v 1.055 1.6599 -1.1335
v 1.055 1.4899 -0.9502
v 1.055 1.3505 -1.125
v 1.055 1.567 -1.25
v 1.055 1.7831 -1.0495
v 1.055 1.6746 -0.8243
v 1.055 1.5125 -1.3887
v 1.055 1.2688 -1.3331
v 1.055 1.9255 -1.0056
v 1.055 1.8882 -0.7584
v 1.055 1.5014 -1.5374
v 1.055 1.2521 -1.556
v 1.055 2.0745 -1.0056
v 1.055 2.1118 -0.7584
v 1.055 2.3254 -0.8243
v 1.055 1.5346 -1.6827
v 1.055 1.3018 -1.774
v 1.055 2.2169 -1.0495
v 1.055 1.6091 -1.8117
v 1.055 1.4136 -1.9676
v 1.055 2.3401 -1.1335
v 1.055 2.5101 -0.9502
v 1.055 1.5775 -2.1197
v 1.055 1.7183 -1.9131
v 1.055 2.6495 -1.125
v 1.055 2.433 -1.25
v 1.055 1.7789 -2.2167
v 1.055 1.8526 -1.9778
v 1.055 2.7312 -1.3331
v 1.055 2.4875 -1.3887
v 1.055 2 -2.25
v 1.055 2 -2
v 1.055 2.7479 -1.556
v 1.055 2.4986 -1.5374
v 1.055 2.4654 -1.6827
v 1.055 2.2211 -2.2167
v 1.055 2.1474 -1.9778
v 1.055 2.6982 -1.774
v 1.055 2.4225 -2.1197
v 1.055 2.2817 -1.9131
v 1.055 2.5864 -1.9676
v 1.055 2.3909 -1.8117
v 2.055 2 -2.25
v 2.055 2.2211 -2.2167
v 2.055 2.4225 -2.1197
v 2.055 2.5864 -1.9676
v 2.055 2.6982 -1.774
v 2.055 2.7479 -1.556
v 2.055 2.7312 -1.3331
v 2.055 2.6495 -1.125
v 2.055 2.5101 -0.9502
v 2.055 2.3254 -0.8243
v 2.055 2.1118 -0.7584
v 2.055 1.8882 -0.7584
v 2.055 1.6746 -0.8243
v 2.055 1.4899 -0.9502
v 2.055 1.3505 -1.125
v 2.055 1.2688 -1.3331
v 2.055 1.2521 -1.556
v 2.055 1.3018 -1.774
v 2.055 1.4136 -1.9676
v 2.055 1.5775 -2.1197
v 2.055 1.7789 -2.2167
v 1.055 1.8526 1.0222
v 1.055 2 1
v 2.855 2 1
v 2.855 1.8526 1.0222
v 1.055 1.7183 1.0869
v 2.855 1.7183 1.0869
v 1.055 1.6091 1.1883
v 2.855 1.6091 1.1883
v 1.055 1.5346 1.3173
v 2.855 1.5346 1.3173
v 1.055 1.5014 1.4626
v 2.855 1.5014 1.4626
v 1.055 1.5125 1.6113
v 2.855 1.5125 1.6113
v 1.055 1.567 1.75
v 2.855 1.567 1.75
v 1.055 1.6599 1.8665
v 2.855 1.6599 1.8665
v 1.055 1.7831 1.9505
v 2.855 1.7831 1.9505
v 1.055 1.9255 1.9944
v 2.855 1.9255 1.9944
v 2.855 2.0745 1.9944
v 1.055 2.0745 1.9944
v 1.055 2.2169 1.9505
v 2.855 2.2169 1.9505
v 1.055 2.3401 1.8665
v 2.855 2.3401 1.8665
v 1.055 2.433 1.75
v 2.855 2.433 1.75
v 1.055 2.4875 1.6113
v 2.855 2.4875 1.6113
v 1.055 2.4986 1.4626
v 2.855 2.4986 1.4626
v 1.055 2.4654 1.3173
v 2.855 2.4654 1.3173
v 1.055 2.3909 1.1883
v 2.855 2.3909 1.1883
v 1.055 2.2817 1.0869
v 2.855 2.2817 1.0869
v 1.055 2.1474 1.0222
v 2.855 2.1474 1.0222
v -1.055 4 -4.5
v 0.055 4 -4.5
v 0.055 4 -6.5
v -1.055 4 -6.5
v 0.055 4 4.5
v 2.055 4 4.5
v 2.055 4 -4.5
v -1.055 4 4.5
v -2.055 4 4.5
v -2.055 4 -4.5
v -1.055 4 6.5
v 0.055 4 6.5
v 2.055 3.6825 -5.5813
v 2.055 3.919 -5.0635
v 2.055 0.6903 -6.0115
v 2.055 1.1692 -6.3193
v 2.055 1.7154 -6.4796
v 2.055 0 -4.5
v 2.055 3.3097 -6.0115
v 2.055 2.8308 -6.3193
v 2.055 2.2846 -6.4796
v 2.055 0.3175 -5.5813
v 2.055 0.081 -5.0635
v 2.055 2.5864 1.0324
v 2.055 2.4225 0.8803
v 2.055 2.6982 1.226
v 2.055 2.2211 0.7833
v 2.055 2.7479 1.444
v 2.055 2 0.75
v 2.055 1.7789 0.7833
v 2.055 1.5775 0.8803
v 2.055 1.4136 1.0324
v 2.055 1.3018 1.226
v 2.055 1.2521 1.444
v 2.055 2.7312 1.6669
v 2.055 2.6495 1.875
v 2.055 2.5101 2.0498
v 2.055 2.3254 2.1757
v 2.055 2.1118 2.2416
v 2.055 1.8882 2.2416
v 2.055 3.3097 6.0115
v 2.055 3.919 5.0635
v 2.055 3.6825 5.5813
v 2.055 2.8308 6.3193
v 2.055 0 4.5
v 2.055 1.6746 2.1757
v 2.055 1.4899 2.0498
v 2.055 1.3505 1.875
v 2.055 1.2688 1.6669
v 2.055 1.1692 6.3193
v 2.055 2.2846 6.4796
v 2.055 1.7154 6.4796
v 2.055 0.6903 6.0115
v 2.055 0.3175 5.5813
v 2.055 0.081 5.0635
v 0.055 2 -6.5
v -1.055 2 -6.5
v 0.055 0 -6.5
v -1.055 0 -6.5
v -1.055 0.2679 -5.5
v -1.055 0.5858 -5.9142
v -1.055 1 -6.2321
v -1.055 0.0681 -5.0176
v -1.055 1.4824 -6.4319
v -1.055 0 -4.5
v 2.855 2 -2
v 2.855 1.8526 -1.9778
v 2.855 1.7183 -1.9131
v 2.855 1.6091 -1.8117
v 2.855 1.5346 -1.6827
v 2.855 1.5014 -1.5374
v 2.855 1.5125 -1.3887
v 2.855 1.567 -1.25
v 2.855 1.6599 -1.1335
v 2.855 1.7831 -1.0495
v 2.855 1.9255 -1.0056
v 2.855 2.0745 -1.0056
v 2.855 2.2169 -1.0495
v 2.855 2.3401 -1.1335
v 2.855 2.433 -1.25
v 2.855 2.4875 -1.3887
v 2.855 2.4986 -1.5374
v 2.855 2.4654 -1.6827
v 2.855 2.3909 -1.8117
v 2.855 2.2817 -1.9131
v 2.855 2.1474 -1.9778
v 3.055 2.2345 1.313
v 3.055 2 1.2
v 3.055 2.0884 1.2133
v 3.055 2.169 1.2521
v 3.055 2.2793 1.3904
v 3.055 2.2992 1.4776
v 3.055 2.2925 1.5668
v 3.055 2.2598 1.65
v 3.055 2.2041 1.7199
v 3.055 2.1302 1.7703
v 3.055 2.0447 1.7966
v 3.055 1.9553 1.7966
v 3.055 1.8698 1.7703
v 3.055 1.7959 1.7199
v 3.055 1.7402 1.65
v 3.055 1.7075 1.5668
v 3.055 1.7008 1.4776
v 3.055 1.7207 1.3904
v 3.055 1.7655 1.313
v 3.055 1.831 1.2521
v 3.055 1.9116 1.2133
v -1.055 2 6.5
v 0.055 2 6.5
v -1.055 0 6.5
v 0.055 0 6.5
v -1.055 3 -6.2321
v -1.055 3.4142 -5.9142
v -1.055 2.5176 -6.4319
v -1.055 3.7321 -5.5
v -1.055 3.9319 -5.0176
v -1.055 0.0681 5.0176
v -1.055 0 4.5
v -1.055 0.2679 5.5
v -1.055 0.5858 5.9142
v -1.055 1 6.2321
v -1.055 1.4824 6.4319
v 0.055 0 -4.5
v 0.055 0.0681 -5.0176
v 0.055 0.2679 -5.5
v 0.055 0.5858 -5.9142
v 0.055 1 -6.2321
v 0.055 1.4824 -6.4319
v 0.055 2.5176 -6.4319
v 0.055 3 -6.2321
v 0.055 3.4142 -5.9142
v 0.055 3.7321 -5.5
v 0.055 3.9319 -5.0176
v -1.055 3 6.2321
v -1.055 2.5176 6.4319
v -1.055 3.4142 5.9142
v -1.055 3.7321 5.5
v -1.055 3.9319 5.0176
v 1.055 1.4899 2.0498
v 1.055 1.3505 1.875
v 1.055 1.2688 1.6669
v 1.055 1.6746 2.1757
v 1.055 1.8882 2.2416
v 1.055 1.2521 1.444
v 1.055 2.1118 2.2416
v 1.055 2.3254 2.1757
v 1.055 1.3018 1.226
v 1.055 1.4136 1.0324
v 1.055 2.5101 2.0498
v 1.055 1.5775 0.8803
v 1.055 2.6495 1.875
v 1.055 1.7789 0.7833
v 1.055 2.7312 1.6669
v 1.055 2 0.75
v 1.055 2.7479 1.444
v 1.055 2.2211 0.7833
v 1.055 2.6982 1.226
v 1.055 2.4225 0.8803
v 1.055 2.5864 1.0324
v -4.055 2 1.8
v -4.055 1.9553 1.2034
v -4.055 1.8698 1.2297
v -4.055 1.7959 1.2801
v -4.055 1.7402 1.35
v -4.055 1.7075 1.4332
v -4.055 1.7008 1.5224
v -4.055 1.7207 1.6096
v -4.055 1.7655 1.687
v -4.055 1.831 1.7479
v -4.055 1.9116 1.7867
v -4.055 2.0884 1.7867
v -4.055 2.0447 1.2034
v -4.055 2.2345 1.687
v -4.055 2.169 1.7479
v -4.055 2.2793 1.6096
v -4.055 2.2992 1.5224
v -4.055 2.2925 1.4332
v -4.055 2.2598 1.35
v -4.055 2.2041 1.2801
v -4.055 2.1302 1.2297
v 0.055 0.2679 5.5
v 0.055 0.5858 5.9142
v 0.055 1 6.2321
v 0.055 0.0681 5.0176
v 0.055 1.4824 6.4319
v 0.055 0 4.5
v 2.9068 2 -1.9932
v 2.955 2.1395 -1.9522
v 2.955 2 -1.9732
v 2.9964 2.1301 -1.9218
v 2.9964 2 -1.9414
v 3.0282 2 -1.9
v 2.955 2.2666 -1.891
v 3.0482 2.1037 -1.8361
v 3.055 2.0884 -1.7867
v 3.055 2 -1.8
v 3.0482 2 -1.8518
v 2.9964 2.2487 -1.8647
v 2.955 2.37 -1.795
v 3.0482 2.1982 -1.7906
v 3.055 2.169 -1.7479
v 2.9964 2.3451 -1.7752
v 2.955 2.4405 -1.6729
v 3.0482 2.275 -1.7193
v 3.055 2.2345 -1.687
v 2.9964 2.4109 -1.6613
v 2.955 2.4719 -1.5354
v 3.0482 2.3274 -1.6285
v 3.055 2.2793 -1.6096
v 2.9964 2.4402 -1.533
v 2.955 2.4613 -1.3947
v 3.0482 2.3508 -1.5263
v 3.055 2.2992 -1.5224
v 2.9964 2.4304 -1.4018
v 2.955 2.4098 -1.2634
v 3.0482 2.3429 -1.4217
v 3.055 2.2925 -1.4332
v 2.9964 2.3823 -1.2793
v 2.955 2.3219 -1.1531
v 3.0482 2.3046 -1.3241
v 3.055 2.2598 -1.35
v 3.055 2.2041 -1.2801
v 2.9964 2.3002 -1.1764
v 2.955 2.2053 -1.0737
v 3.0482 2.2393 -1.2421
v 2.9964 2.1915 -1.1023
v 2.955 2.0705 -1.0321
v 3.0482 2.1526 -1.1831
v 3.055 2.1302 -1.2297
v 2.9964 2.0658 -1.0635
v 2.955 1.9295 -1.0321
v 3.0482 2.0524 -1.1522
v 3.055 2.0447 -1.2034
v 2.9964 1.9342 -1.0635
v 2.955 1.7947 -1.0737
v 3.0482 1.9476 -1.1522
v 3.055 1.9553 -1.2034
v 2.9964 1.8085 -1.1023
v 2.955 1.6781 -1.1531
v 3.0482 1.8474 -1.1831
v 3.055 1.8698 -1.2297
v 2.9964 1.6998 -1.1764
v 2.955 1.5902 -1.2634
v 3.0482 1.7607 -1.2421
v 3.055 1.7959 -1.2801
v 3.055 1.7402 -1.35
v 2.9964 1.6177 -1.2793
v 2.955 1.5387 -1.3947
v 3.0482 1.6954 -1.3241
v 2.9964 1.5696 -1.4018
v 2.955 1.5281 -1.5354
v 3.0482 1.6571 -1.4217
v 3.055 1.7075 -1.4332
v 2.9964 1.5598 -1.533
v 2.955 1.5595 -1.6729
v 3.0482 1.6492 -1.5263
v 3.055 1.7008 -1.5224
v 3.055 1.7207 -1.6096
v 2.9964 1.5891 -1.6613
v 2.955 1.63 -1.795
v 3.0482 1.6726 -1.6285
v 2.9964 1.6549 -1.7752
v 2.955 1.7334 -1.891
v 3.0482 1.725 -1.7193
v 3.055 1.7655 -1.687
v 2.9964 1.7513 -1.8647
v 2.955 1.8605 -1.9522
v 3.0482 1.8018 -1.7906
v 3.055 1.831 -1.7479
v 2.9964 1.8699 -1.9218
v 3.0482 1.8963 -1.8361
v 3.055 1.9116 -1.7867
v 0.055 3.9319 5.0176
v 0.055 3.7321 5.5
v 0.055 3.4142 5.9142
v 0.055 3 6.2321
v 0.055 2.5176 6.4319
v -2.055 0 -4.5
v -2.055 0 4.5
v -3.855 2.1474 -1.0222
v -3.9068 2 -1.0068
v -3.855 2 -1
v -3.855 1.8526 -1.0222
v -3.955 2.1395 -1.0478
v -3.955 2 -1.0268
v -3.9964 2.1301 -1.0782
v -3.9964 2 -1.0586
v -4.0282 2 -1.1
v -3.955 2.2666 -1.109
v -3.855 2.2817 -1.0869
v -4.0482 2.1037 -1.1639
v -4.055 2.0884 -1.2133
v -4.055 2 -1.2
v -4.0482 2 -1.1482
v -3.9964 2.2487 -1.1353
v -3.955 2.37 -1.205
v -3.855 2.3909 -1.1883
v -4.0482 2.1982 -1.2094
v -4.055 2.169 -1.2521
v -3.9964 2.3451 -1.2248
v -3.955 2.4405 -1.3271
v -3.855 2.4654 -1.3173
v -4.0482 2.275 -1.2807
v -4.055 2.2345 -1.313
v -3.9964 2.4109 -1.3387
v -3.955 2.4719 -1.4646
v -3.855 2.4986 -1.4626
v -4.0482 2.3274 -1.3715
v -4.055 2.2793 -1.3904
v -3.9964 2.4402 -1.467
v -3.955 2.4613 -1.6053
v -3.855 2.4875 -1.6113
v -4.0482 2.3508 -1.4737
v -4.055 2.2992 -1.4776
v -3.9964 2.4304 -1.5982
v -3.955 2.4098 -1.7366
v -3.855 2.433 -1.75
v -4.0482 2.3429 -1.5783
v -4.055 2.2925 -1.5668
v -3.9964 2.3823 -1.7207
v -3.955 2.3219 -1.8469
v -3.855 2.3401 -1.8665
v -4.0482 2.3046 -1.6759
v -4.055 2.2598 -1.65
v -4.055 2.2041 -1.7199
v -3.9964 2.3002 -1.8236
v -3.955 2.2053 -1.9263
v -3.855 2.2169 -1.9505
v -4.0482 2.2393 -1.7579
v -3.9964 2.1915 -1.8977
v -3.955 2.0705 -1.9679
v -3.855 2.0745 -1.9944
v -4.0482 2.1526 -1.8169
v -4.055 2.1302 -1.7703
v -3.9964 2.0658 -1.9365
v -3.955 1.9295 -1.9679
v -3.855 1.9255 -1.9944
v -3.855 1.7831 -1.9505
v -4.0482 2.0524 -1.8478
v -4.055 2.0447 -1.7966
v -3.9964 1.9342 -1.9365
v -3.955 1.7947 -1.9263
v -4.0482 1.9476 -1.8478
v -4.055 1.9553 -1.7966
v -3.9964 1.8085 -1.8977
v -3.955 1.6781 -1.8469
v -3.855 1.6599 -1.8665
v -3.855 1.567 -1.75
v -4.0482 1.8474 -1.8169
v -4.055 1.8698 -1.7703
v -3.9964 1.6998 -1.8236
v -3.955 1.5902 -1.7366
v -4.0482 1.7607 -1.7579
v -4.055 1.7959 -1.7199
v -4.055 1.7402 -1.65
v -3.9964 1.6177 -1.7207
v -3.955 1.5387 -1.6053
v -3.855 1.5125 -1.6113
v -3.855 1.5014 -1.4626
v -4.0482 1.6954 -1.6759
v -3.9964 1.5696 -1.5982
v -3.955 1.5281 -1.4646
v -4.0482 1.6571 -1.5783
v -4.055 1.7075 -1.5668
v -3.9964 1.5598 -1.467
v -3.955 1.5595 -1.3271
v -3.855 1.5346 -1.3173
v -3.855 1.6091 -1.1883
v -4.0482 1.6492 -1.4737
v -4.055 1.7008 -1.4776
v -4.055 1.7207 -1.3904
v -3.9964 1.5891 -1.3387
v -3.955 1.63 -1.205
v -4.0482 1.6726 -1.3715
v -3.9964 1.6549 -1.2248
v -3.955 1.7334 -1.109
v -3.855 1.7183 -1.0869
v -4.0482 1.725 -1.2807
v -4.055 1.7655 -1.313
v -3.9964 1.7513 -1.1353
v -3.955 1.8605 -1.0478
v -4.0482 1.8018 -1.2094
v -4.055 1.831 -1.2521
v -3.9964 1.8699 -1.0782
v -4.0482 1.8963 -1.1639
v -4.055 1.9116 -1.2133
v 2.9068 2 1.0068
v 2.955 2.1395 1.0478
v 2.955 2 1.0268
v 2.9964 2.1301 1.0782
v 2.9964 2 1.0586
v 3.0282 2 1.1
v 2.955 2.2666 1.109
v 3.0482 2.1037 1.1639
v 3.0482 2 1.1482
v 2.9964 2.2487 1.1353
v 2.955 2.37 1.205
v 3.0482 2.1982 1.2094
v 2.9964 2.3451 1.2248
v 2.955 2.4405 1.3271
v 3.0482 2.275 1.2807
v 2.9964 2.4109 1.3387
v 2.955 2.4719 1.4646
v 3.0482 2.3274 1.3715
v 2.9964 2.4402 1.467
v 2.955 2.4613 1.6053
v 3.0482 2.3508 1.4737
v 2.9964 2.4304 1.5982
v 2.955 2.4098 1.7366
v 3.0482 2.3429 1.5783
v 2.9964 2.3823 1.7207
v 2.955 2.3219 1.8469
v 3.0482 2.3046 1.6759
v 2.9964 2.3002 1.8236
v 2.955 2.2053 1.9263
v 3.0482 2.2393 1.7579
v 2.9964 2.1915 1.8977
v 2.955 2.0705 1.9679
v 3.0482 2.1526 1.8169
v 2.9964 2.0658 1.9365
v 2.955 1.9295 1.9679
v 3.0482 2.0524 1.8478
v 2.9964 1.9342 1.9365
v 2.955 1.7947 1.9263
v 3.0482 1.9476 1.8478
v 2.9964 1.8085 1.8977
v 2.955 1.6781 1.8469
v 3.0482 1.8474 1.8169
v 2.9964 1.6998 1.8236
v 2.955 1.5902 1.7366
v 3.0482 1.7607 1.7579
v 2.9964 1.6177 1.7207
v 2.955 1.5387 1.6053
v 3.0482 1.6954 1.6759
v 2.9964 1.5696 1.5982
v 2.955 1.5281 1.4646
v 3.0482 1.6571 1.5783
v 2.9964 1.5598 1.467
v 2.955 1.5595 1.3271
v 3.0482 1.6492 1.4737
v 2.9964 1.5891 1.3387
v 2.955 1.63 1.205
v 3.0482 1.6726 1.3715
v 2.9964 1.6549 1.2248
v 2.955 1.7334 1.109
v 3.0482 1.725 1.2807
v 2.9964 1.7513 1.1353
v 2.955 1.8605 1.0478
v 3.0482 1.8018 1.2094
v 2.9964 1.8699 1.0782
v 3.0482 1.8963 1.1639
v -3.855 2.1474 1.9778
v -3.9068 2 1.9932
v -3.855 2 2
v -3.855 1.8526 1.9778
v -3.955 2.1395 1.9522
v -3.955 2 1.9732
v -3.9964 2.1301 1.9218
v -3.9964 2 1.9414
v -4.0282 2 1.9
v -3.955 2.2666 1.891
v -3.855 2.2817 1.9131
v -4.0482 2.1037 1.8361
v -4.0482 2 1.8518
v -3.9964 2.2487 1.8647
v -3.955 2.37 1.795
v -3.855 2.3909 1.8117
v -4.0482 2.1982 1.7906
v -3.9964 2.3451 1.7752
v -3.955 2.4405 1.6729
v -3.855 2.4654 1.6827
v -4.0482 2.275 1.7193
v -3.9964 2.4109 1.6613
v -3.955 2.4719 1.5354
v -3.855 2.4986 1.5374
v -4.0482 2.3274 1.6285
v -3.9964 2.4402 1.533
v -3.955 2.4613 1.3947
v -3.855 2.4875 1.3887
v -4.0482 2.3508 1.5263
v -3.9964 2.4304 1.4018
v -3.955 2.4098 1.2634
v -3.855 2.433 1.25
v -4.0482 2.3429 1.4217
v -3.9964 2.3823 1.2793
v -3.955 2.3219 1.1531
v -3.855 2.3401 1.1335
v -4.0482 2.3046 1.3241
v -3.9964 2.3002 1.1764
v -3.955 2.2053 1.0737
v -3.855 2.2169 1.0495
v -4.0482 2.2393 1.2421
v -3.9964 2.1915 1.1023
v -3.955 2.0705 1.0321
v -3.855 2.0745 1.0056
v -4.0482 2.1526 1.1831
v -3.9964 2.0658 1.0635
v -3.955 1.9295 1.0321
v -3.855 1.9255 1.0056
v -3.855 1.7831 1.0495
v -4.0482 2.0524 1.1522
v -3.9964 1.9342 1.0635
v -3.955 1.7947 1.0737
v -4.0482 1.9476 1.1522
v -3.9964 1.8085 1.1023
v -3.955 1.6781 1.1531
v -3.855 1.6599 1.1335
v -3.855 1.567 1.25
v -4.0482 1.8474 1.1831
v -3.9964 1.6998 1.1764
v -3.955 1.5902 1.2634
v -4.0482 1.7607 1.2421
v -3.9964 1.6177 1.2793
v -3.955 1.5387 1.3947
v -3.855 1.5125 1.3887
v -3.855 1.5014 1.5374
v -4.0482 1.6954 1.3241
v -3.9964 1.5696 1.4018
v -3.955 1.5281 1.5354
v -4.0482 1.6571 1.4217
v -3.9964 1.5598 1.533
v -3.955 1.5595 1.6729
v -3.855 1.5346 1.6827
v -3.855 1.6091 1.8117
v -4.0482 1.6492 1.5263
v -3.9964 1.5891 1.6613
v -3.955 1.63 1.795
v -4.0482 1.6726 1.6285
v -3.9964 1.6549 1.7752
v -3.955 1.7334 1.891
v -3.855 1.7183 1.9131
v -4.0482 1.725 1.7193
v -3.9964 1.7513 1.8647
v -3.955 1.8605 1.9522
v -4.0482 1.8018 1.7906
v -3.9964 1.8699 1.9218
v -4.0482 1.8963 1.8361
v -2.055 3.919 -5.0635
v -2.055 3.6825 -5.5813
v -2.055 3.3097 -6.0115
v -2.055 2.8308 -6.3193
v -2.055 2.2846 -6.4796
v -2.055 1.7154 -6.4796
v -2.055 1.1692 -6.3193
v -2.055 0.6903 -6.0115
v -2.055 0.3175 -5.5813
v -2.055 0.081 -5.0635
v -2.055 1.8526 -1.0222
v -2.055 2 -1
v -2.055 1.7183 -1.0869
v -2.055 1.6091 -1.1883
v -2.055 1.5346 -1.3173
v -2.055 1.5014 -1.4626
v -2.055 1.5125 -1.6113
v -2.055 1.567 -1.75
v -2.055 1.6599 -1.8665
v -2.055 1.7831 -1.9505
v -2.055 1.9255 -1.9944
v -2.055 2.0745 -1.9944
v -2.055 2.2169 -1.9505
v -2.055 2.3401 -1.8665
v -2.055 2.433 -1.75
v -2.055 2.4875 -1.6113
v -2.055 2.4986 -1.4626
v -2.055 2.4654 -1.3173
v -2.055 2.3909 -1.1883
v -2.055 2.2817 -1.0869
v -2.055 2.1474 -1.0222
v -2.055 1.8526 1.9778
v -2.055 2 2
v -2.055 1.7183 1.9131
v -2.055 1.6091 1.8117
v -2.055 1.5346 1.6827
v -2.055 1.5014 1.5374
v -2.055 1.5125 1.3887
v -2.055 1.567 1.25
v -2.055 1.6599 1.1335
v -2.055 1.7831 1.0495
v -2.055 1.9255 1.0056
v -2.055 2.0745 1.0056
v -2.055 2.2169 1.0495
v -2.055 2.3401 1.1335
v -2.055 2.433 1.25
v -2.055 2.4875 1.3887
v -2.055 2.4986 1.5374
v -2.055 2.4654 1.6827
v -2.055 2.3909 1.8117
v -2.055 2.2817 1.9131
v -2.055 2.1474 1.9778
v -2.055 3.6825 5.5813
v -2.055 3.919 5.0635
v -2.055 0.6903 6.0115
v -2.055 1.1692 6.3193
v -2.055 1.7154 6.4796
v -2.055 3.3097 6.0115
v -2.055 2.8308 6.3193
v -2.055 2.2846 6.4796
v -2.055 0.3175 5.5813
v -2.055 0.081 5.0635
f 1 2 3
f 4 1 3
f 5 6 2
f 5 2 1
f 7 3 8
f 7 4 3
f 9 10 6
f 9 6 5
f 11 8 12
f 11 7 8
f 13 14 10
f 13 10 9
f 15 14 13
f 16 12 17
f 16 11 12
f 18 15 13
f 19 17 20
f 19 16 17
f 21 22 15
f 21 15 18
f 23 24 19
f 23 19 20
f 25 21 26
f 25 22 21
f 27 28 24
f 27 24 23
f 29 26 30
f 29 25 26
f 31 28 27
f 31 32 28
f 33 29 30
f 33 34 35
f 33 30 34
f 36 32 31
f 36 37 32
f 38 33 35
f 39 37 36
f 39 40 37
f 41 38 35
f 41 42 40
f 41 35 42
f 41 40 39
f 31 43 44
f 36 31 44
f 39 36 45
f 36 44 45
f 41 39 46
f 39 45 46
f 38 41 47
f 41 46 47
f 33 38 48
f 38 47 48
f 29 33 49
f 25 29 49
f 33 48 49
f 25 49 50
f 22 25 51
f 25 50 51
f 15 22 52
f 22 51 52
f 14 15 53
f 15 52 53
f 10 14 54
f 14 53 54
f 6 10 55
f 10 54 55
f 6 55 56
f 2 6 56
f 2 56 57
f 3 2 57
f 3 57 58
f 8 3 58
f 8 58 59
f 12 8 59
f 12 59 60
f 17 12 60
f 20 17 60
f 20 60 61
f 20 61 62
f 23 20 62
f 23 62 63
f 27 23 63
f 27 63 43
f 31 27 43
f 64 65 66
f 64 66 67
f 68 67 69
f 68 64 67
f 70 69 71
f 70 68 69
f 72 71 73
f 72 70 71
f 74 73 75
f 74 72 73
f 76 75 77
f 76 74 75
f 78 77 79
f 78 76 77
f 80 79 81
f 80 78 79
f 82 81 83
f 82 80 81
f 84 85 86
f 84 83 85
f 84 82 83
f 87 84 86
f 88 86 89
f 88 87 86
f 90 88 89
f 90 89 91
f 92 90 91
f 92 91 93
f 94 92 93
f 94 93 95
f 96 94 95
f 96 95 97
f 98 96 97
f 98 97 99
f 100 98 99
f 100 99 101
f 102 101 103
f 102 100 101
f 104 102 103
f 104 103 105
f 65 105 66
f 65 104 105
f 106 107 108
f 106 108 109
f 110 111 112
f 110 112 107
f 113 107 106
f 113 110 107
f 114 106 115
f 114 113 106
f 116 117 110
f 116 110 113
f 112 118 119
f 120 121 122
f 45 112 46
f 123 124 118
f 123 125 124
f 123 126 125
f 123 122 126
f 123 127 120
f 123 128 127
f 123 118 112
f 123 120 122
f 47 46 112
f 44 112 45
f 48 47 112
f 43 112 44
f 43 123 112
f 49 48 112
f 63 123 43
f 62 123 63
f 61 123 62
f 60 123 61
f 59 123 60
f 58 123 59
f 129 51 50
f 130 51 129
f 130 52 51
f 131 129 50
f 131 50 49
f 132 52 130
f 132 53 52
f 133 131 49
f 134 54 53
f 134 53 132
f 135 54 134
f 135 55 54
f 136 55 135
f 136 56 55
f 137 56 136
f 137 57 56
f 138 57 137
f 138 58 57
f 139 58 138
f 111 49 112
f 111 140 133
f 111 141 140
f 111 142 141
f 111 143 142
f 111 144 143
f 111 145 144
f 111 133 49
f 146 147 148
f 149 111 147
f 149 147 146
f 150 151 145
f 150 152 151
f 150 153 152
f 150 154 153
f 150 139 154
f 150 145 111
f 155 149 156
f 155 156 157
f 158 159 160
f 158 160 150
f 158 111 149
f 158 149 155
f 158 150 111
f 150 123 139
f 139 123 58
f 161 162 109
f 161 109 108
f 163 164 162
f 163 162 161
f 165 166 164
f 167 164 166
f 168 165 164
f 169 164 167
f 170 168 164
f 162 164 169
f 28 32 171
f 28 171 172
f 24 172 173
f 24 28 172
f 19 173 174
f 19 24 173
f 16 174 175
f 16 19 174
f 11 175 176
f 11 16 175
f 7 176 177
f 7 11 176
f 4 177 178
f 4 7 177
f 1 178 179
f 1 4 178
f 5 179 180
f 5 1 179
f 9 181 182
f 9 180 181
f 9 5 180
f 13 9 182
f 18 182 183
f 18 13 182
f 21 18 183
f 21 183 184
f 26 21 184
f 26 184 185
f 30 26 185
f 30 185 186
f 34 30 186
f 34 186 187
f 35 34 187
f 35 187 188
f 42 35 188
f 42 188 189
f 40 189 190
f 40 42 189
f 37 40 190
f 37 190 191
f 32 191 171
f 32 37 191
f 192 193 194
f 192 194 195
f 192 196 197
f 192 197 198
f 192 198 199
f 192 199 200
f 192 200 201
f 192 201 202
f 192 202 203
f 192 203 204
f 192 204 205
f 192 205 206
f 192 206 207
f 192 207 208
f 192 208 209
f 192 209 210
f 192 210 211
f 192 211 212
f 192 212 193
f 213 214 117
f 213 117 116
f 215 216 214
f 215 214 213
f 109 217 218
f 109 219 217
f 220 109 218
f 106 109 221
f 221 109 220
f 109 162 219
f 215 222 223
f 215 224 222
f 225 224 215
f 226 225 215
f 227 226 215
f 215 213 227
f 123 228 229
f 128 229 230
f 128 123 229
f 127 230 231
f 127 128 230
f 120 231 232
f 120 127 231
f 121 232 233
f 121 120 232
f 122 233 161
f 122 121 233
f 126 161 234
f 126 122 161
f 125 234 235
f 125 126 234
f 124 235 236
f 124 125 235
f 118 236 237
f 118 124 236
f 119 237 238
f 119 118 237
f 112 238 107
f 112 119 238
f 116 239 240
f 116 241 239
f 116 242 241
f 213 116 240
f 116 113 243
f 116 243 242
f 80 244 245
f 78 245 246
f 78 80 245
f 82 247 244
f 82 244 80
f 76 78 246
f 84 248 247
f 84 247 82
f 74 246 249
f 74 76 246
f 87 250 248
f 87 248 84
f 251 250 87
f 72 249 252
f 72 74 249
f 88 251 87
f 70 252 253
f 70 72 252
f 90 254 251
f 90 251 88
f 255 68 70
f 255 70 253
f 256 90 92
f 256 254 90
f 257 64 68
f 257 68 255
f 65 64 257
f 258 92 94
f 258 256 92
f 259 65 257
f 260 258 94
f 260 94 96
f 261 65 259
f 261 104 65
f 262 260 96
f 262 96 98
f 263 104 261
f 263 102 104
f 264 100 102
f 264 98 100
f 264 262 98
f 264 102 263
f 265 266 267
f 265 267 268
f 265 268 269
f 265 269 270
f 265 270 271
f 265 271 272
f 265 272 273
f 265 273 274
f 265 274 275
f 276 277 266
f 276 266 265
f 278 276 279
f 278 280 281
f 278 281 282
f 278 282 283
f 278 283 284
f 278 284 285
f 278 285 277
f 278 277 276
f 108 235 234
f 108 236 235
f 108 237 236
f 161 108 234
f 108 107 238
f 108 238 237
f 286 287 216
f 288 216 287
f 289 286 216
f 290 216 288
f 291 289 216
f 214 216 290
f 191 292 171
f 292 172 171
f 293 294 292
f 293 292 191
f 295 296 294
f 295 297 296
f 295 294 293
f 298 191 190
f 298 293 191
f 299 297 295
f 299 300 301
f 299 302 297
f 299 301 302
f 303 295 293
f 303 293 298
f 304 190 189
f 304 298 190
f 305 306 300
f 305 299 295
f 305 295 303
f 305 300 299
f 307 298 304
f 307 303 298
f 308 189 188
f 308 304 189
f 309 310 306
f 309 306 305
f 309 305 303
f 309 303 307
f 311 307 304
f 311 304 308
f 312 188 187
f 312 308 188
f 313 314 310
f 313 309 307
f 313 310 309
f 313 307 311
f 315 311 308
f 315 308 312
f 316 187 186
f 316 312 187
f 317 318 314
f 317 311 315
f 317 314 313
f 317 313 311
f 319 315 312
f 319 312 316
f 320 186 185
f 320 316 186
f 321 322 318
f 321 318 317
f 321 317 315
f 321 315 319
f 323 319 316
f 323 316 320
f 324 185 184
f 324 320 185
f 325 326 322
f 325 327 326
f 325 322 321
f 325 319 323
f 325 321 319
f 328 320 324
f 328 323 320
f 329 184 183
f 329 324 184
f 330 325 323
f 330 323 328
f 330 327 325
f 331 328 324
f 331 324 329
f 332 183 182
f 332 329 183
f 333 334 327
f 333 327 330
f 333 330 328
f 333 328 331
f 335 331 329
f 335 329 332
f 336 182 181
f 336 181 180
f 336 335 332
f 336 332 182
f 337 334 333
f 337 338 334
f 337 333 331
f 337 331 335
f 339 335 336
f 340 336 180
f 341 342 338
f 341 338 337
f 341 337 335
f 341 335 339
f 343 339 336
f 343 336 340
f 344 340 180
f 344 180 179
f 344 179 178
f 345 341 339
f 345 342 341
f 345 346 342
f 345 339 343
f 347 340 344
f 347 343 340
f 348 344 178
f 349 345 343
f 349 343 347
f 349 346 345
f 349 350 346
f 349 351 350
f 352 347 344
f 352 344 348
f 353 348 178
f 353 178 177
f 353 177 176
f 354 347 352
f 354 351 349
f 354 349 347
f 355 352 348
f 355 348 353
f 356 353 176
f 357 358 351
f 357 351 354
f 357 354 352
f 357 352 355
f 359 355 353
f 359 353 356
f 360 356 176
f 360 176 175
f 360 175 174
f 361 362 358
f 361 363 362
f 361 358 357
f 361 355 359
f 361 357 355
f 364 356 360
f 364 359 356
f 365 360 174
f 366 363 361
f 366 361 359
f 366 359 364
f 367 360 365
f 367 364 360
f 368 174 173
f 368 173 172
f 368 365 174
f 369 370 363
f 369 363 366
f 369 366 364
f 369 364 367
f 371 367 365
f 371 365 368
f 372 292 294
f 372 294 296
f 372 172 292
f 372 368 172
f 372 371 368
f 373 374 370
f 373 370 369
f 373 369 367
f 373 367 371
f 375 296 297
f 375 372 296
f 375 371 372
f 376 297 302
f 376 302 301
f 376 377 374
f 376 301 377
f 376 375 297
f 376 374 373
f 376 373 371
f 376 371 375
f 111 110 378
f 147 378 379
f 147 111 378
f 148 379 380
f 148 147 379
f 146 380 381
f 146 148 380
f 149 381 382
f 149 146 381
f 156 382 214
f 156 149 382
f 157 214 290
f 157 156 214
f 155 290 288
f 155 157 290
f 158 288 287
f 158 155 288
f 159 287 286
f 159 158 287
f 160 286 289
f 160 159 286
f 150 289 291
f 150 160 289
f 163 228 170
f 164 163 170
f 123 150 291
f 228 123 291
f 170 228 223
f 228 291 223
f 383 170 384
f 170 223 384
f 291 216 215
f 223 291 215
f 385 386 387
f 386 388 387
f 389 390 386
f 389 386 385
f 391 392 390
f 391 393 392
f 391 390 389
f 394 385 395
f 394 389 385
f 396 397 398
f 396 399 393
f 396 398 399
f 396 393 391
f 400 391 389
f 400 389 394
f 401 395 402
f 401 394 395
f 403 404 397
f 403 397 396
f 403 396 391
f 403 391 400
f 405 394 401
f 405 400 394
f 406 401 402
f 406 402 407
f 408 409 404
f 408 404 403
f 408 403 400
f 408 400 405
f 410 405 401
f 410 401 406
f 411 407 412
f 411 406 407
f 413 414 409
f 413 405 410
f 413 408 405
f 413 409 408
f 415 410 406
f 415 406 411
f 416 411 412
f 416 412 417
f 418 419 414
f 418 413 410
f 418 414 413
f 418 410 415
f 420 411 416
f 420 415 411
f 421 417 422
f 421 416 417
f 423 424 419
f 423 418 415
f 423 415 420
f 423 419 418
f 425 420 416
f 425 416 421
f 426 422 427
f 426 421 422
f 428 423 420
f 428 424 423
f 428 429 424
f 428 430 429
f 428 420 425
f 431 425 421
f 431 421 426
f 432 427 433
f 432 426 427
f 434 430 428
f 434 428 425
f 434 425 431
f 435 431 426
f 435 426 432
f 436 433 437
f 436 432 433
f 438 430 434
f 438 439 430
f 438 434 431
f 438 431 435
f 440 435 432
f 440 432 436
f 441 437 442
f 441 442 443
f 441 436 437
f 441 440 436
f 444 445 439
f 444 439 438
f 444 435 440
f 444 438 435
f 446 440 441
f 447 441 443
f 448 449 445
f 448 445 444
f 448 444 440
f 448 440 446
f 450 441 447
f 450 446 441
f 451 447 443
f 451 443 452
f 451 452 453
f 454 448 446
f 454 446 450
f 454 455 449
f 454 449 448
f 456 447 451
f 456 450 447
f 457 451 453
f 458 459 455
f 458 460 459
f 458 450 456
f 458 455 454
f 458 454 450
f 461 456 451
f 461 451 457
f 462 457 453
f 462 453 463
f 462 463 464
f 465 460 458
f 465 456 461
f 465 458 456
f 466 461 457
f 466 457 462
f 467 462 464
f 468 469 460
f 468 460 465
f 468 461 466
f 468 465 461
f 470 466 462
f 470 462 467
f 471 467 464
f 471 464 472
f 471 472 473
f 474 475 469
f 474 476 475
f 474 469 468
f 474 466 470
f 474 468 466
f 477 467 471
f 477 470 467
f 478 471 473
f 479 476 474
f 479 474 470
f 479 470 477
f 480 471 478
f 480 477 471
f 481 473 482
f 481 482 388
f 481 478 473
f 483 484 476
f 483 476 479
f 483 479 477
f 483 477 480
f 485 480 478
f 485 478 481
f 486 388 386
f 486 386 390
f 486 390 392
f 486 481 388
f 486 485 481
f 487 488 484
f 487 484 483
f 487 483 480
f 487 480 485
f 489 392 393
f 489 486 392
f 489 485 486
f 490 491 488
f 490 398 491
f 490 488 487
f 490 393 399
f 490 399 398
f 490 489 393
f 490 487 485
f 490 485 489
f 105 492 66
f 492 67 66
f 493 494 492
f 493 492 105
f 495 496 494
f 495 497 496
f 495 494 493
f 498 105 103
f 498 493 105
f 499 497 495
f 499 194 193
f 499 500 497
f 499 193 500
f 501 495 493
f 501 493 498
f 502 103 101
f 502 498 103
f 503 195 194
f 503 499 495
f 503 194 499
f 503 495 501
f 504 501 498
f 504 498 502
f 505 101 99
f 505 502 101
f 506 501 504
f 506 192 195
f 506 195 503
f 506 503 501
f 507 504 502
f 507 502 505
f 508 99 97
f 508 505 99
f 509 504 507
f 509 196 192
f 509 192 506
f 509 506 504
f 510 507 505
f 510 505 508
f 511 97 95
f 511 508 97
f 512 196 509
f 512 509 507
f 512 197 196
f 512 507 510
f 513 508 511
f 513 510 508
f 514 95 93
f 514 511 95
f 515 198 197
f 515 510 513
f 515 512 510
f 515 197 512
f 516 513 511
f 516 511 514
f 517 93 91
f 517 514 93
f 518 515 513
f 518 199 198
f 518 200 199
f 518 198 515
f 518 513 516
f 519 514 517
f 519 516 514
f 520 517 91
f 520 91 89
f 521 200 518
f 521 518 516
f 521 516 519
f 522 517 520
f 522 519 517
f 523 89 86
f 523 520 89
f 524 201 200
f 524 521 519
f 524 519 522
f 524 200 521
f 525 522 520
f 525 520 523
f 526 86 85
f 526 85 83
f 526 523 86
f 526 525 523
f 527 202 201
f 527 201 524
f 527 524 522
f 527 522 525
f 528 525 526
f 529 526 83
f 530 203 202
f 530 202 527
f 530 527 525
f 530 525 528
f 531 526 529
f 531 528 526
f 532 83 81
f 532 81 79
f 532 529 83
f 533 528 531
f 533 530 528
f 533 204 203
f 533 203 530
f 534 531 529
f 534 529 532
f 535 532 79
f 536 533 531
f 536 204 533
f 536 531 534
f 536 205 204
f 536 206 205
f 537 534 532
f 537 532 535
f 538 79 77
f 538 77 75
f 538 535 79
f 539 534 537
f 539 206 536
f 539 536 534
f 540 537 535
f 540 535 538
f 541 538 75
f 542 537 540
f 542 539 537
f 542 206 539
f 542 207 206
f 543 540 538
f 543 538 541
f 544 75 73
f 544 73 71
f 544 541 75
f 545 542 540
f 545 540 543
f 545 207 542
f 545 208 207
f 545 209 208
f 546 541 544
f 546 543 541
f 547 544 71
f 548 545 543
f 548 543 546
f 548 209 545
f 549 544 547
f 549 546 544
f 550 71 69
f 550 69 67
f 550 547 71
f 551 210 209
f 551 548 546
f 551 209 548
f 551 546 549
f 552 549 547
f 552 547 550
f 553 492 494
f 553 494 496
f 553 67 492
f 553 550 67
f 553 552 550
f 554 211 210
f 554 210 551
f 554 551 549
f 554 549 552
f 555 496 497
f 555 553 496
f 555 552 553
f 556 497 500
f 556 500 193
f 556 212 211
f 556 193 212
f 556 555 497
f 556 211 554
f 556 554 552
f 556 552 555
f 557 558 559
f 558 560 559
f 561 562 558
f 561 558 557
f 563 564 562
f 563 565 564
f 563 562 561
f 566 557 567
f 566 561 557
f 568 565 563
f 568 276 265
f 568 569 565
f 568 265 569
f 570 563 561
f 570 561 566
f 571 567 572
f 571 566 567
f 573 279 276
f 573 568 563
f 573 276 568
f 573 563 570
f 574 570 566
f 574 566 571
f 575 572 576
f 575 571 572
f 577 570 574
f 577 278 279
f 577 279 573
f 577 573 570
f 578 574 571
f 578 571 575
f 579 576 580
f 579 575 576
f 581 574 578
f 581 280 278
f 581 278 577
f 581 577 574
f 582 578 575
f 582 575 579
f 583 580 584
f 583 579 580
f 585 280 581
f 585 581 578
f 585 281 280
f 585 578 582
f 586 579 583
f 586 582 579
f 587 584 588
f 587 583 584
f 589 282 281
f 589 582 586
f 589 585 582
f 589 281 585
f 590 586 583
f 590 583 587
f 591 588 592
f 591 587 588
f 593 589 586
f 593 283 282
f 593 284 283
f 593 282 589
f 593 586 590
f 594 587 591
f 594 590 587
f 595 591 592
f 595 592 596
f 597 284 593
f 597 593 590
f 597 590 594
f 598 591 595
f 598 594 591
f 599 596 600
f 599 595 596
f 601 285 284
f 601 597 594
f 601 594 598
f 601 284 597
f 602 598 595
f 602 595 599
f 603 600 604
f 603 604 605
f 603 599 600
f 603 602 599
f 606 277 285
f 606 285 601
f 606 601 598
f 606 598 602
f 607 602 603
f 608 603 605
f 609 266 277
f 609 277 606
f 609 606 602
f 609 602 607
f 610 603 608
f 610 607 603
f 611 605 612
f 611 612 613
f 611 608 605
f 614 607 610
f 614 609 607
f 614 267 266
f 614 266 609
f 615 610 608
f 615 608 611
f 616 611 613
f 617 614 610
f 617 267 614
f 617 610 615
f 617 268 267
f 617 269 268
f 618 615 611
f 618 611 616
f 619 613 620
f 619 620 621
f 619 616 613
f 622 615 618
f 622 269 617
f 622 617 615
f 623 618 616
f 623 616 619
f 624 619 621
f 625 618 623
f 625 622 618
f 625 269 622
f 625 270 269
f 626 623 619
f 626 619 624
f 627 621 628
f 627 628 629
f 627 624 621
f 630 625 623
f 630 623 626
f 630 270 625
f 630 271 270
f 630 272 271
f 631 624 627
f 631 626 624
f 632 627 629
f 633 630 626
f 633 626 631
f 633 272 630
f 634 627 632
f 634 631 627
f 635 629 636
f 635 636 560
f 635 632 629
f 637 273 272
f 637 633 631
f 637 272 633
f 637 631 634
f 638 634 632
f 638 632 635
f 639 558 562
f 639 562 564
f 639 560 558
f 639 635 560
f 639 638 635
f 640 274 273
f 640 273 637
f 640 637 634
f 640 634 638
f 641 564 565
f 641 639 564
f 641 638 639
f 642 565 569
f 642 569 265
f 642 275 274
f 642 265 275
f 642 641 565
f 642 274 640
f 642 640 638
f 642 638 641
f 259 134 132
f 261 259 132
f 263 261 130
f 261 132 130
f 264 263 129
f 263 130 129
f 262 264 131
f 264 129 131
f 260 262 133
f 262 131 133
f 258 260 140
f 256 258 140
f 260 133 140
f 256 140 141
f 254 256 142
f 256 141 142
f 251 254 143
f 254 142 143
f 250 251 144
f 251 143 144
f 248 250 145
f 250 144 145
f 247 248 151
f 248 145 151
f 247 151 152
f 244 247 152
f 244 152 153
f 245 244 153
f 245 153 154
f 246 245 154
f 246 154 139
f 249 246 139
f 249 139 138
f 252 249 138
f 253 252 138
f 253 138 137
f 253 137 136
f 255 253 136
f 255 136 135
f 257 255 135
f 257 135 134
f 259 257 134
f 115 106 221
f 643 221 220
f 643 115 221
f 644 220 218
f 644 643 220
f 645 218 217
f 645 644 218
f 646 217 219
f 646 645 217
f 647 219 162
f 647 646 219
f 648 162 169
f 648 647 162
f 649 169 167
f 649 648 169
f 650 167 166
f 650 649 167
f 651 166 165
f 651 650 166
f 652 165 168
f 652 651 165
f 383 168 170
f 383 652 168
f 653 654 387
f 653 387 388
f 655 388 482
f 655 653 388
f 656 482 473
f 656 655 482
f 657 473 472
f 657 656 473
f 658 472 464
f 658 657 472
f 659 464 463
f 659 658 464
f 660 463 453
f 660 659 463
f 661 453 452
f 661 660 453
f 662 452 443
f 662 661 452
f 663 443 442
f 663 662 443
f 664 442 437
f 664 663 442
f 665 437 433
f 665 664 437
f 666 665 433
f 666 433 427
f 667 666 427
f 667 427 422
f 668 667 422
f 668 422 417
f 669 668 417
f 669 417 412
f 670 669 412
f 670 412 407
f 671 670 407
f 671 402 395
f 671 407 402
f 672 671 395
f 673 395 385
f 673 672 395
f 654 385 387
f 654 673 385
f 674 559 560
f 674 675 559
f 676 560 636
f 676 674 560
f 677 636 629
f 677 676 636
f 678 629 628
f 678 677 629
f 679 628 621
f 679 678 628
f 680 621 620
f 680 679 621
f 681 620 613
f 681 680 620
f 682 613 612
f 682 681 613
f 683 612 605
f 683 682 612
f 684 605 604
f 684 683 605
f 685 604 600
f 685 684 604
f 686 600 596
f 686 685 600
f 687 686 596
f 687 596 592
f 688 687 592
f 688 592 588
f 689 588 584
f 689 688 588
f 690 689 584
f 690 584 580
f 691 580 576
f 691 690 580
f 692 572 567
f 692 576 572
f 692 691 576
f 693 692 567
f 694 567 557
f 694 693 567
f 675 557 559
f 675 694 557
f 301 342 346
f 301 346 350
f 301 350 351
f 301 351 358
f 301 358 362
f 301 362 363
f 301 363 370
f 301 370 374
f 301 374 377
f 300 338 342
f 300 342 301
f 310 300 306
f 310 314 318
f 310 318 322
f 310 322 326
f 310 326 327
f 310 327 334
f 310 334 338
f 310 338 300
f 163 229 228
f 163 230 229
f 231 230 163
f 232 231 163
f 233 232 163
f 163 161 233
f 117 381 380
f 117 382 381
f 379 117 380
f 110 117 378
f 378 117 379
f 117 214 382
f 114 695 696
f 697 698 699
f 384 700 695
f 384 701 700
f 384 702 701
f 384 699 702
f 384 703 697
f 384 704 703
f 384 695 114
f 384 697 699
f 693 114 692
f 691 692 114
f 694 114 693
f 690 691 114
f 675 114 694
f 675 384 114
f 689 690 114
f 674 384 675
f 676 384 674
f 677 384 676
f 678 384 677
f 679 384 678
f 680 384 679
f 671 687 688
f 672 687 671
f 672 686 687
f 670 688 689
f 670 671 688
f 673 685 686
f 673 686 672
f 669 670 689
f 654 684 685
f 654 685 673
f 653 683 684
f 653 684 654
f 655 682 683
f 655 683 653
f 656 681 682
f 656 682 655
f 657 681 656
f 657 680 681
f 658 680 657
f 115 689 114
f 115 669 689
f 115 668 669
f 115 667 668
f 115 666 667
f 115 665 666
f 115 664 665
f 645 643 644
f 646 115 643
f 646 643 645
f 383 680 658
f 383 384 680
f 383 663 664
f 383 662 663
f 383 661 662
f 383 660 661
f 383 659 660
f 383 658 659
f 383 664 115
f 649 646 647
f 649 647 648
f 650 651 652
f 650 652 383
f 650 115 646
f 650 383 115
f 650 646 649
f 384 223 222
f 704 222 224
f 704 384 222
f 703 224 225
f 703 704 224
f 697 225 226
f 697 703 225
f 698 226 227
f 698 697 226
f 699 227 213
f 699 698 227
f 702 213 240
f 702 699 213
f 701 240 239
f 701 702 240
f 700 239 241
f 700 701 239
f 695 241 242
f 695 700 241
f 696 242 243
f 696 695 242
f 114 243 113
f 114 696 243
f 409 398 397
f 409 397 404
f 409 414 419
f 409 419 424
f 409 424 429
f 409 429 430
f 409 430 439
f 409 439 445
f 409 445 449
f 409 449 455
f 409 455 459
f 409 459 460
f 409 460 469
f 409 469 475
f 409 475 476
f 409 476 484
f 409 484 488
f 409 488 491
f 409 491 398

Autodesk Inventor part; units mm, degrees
ref_plane "YZ Plane" through (0, 0, 0) normal (1, 0, 0) x (0, 1, 0)
ref_plane "XZ Plane" through (0, 0, 0) normal (0, 1, 0) x (-1, 0, 0)
ref_plane "XY Plane" through (0, 0, 0) normal (0, 0, 1) x (1, 0, 0)
sketch "Sketch1" plane through (0, 0, 0) normal (0, 1, 0) x (-1, 0, 0)
  line L0 (-2.055, 6.5) -> (2.055, 6.5)
  line L1 (2.055, 6.5) -> (2.055, -6.5)
  line L2 (2.055, -6.5) -> (-2.055, -6.5)
  line L3 (-2.055, -6.5) -> (-2.055, 6.5)
  line L4 (-2.055, 6.5) -> (2.055, -6.5) construction
  line L5 (2.055, 6.5) -> (-2.055, -6.5) construction
  point P0 (0, 0)
  dimension "d0" = 4.11
  dimension "d1" = 13
extrude "Extrusion1" add sketch "Sketch1" along normal blind 4
sketch "Sketch2" plane through (2.055, 0, 6.5) normal (1, 0, 0) x (0, 0, -1)
  line L0 (0, 0) -> (0, 4) projected
  line L1 (0, 2) -> (13, 2) construction
  line L2 (13, 0) -> (13, 4) projected
  line L3 (2, 0) -> (11, 0)
  line L4 (11, 4) -> (2, 4)
  arc A0 (2, 4) -> (2, 0) centre (2, 2) ccw
  arc A1 (11, 0) -> (11, 4) centre (11, 2) ccw
  line L5 (0, 4) -> (13, 4) projected
  line L6 (0, 0) -> (13, 0) projected
  point P0 (6.5, 0)
  point P1 (6.5, 2)
extrude "Extrusion2" cut sketch "Sketch2" against normal blind 2 contours L0 A0 L6 | L0 L5 A0 | A1 L2 L6 | L5 L2 A1
sketch "Sketch3" plane through (-2.055, 0, -6.5) normal (-1, 0, 0) x (0, 0, 1)
  arc A0 (2, 4) -> (0, 2) centre (2, 2) ccw projected
  line L0 (0, 0) -> (0, 4) projected
  line L1 (0, 4) -> (13, 4) projected
  arc A1 (0, 2) -> (2, 0) centre (2, 2) ccw projected
  arc A2 (2, 4) -> (2, 0) centre (2, 2) ccw projected
  line L2 (11, 4) -> (2, 4) projected
  arc A3 (11, 0) -> (11, 4) centre (11, 2) ccw projected
  line L3 (11, 0) -> (2, 0) projected
  line L4 (13, 0) -> (13, 4) projected
  line L5 (0, 0) -> (13, 0) projected
  point P0 (6.5, 0)
  point P1 (13, 2)
extrude "Extrusion3" cut sketch "Sketch3" against normal blind 1 contours A0 L0 L1 | A1 L5 L0 | L1 L4 A3 | L4 L5 A3
sketch "Sketch4" plane through (-2.055, 0, -4.5) normal (-1, 0, 0) x (0, 0, 1)
  arc A0 (0, 4) -> (-2, 2) centre (0, 2) ccw projected
  circle A1 centre (0, 2) radius 1.5
  arc A2 (11, 2) -> (9, 4) centre (9, 2) ccw projected
  circle A3 centre (9, 2) radius 1.5
  point P0 (4.5, 0)
  dimension "d8" = 3
  dimension "d9" = 3
mark "Mark1"
sketch "Sketch5" plane through (-2.055, 0, -4.5) normal (-1, 0, 0) x (0, 0, 1)
  circle A0 centre (3, 2) radius 1
  circle A1 centre (0, 2) radius 1.5 projected
  circle A2 centre (9, 2) radius 1.5 projected
  line L0 (0, 4) -> (9, 4) projected
  circle A3 centre (6, 2) radius 1
  point P0 (4.5, 0)
  dimension "d10" = 2
  dimension "d11" = 3
  dimension "d12" = 9
  dimension "d15" = 3
mark "Mark2"
sketch "Sketch6" plane through (-2.055, 2, -1.5) normal (-1, 0, 0) x (0, 0, 1)
  circle A0 centre (0, 0) radius 1 projected
  circle A1 centre (0, 0) radius 0.5
  circle A2 centre (3, 0) radius 1 projected
  circle A3 centre (3, 0) radius 0.5
  point P0 (1.5, -2)
  dimension "d20" = 1
  dimension "d21" = 1
extrude "Extrusion4" add sketch "Sketch6" along normal blind 2 contours A1 | A3
sketch "Sketch7" plane through (2.055, 0, 4.5) normal (1, 0, 0) x (0, 0, -1)
  circle A0 centre (0, 2) radius 1.5 projected
  circle A1 centre (9, 2) radius 1.5 projected
  point P0 (4.5, 0)
mark "Mark3"
sketch "Sketch8" plane through (2.055, 0, 4.5) normal (1, 0, 0) x (0, 0, -1)
  circle A0 centre (6, 2) radius 1 projected
  circle A1 centre (3, 2) radius 1 projected
  circle A2 centre (3, 2) radius 0.75
  circle A3 centre (6, 2) radius 0.75
  point P0 (4.5, 0)
  dimension "d24" = 1.5
  dimension "d25" = 1.5
extrude "Extrusion5" cut sketch "Sketch8" against normal blind 1 contours A2 | A3
sketch "Sketch9" plane through (1.055, 2, 1.5) normal (1, 0, 0) x (0, 0, -1)
  circle A0 centre (3, 0) radius 0.5 projected
  circle A1 centre (0, 0) radius 0.5 projected
  point P0 (1.5, -2)
extrude "Extrusion6" add sketch "Sketch9" along normal blind 2
fillet "Fillet1" radius 0.2 4 edges at (3.055, 2, 2) (3.055, 2, -1) (-4.055, 2, -2) (-4.055, 2, 1)
equation "\"d9\" = d8"
equation "\"d11\" = 0.333333 * d12"
equation "\"d15\" = d11"
equation "\"d21\" = d20"
equation "\"d25\" = d24"
properties part number "2_pin_no_ear_male"
